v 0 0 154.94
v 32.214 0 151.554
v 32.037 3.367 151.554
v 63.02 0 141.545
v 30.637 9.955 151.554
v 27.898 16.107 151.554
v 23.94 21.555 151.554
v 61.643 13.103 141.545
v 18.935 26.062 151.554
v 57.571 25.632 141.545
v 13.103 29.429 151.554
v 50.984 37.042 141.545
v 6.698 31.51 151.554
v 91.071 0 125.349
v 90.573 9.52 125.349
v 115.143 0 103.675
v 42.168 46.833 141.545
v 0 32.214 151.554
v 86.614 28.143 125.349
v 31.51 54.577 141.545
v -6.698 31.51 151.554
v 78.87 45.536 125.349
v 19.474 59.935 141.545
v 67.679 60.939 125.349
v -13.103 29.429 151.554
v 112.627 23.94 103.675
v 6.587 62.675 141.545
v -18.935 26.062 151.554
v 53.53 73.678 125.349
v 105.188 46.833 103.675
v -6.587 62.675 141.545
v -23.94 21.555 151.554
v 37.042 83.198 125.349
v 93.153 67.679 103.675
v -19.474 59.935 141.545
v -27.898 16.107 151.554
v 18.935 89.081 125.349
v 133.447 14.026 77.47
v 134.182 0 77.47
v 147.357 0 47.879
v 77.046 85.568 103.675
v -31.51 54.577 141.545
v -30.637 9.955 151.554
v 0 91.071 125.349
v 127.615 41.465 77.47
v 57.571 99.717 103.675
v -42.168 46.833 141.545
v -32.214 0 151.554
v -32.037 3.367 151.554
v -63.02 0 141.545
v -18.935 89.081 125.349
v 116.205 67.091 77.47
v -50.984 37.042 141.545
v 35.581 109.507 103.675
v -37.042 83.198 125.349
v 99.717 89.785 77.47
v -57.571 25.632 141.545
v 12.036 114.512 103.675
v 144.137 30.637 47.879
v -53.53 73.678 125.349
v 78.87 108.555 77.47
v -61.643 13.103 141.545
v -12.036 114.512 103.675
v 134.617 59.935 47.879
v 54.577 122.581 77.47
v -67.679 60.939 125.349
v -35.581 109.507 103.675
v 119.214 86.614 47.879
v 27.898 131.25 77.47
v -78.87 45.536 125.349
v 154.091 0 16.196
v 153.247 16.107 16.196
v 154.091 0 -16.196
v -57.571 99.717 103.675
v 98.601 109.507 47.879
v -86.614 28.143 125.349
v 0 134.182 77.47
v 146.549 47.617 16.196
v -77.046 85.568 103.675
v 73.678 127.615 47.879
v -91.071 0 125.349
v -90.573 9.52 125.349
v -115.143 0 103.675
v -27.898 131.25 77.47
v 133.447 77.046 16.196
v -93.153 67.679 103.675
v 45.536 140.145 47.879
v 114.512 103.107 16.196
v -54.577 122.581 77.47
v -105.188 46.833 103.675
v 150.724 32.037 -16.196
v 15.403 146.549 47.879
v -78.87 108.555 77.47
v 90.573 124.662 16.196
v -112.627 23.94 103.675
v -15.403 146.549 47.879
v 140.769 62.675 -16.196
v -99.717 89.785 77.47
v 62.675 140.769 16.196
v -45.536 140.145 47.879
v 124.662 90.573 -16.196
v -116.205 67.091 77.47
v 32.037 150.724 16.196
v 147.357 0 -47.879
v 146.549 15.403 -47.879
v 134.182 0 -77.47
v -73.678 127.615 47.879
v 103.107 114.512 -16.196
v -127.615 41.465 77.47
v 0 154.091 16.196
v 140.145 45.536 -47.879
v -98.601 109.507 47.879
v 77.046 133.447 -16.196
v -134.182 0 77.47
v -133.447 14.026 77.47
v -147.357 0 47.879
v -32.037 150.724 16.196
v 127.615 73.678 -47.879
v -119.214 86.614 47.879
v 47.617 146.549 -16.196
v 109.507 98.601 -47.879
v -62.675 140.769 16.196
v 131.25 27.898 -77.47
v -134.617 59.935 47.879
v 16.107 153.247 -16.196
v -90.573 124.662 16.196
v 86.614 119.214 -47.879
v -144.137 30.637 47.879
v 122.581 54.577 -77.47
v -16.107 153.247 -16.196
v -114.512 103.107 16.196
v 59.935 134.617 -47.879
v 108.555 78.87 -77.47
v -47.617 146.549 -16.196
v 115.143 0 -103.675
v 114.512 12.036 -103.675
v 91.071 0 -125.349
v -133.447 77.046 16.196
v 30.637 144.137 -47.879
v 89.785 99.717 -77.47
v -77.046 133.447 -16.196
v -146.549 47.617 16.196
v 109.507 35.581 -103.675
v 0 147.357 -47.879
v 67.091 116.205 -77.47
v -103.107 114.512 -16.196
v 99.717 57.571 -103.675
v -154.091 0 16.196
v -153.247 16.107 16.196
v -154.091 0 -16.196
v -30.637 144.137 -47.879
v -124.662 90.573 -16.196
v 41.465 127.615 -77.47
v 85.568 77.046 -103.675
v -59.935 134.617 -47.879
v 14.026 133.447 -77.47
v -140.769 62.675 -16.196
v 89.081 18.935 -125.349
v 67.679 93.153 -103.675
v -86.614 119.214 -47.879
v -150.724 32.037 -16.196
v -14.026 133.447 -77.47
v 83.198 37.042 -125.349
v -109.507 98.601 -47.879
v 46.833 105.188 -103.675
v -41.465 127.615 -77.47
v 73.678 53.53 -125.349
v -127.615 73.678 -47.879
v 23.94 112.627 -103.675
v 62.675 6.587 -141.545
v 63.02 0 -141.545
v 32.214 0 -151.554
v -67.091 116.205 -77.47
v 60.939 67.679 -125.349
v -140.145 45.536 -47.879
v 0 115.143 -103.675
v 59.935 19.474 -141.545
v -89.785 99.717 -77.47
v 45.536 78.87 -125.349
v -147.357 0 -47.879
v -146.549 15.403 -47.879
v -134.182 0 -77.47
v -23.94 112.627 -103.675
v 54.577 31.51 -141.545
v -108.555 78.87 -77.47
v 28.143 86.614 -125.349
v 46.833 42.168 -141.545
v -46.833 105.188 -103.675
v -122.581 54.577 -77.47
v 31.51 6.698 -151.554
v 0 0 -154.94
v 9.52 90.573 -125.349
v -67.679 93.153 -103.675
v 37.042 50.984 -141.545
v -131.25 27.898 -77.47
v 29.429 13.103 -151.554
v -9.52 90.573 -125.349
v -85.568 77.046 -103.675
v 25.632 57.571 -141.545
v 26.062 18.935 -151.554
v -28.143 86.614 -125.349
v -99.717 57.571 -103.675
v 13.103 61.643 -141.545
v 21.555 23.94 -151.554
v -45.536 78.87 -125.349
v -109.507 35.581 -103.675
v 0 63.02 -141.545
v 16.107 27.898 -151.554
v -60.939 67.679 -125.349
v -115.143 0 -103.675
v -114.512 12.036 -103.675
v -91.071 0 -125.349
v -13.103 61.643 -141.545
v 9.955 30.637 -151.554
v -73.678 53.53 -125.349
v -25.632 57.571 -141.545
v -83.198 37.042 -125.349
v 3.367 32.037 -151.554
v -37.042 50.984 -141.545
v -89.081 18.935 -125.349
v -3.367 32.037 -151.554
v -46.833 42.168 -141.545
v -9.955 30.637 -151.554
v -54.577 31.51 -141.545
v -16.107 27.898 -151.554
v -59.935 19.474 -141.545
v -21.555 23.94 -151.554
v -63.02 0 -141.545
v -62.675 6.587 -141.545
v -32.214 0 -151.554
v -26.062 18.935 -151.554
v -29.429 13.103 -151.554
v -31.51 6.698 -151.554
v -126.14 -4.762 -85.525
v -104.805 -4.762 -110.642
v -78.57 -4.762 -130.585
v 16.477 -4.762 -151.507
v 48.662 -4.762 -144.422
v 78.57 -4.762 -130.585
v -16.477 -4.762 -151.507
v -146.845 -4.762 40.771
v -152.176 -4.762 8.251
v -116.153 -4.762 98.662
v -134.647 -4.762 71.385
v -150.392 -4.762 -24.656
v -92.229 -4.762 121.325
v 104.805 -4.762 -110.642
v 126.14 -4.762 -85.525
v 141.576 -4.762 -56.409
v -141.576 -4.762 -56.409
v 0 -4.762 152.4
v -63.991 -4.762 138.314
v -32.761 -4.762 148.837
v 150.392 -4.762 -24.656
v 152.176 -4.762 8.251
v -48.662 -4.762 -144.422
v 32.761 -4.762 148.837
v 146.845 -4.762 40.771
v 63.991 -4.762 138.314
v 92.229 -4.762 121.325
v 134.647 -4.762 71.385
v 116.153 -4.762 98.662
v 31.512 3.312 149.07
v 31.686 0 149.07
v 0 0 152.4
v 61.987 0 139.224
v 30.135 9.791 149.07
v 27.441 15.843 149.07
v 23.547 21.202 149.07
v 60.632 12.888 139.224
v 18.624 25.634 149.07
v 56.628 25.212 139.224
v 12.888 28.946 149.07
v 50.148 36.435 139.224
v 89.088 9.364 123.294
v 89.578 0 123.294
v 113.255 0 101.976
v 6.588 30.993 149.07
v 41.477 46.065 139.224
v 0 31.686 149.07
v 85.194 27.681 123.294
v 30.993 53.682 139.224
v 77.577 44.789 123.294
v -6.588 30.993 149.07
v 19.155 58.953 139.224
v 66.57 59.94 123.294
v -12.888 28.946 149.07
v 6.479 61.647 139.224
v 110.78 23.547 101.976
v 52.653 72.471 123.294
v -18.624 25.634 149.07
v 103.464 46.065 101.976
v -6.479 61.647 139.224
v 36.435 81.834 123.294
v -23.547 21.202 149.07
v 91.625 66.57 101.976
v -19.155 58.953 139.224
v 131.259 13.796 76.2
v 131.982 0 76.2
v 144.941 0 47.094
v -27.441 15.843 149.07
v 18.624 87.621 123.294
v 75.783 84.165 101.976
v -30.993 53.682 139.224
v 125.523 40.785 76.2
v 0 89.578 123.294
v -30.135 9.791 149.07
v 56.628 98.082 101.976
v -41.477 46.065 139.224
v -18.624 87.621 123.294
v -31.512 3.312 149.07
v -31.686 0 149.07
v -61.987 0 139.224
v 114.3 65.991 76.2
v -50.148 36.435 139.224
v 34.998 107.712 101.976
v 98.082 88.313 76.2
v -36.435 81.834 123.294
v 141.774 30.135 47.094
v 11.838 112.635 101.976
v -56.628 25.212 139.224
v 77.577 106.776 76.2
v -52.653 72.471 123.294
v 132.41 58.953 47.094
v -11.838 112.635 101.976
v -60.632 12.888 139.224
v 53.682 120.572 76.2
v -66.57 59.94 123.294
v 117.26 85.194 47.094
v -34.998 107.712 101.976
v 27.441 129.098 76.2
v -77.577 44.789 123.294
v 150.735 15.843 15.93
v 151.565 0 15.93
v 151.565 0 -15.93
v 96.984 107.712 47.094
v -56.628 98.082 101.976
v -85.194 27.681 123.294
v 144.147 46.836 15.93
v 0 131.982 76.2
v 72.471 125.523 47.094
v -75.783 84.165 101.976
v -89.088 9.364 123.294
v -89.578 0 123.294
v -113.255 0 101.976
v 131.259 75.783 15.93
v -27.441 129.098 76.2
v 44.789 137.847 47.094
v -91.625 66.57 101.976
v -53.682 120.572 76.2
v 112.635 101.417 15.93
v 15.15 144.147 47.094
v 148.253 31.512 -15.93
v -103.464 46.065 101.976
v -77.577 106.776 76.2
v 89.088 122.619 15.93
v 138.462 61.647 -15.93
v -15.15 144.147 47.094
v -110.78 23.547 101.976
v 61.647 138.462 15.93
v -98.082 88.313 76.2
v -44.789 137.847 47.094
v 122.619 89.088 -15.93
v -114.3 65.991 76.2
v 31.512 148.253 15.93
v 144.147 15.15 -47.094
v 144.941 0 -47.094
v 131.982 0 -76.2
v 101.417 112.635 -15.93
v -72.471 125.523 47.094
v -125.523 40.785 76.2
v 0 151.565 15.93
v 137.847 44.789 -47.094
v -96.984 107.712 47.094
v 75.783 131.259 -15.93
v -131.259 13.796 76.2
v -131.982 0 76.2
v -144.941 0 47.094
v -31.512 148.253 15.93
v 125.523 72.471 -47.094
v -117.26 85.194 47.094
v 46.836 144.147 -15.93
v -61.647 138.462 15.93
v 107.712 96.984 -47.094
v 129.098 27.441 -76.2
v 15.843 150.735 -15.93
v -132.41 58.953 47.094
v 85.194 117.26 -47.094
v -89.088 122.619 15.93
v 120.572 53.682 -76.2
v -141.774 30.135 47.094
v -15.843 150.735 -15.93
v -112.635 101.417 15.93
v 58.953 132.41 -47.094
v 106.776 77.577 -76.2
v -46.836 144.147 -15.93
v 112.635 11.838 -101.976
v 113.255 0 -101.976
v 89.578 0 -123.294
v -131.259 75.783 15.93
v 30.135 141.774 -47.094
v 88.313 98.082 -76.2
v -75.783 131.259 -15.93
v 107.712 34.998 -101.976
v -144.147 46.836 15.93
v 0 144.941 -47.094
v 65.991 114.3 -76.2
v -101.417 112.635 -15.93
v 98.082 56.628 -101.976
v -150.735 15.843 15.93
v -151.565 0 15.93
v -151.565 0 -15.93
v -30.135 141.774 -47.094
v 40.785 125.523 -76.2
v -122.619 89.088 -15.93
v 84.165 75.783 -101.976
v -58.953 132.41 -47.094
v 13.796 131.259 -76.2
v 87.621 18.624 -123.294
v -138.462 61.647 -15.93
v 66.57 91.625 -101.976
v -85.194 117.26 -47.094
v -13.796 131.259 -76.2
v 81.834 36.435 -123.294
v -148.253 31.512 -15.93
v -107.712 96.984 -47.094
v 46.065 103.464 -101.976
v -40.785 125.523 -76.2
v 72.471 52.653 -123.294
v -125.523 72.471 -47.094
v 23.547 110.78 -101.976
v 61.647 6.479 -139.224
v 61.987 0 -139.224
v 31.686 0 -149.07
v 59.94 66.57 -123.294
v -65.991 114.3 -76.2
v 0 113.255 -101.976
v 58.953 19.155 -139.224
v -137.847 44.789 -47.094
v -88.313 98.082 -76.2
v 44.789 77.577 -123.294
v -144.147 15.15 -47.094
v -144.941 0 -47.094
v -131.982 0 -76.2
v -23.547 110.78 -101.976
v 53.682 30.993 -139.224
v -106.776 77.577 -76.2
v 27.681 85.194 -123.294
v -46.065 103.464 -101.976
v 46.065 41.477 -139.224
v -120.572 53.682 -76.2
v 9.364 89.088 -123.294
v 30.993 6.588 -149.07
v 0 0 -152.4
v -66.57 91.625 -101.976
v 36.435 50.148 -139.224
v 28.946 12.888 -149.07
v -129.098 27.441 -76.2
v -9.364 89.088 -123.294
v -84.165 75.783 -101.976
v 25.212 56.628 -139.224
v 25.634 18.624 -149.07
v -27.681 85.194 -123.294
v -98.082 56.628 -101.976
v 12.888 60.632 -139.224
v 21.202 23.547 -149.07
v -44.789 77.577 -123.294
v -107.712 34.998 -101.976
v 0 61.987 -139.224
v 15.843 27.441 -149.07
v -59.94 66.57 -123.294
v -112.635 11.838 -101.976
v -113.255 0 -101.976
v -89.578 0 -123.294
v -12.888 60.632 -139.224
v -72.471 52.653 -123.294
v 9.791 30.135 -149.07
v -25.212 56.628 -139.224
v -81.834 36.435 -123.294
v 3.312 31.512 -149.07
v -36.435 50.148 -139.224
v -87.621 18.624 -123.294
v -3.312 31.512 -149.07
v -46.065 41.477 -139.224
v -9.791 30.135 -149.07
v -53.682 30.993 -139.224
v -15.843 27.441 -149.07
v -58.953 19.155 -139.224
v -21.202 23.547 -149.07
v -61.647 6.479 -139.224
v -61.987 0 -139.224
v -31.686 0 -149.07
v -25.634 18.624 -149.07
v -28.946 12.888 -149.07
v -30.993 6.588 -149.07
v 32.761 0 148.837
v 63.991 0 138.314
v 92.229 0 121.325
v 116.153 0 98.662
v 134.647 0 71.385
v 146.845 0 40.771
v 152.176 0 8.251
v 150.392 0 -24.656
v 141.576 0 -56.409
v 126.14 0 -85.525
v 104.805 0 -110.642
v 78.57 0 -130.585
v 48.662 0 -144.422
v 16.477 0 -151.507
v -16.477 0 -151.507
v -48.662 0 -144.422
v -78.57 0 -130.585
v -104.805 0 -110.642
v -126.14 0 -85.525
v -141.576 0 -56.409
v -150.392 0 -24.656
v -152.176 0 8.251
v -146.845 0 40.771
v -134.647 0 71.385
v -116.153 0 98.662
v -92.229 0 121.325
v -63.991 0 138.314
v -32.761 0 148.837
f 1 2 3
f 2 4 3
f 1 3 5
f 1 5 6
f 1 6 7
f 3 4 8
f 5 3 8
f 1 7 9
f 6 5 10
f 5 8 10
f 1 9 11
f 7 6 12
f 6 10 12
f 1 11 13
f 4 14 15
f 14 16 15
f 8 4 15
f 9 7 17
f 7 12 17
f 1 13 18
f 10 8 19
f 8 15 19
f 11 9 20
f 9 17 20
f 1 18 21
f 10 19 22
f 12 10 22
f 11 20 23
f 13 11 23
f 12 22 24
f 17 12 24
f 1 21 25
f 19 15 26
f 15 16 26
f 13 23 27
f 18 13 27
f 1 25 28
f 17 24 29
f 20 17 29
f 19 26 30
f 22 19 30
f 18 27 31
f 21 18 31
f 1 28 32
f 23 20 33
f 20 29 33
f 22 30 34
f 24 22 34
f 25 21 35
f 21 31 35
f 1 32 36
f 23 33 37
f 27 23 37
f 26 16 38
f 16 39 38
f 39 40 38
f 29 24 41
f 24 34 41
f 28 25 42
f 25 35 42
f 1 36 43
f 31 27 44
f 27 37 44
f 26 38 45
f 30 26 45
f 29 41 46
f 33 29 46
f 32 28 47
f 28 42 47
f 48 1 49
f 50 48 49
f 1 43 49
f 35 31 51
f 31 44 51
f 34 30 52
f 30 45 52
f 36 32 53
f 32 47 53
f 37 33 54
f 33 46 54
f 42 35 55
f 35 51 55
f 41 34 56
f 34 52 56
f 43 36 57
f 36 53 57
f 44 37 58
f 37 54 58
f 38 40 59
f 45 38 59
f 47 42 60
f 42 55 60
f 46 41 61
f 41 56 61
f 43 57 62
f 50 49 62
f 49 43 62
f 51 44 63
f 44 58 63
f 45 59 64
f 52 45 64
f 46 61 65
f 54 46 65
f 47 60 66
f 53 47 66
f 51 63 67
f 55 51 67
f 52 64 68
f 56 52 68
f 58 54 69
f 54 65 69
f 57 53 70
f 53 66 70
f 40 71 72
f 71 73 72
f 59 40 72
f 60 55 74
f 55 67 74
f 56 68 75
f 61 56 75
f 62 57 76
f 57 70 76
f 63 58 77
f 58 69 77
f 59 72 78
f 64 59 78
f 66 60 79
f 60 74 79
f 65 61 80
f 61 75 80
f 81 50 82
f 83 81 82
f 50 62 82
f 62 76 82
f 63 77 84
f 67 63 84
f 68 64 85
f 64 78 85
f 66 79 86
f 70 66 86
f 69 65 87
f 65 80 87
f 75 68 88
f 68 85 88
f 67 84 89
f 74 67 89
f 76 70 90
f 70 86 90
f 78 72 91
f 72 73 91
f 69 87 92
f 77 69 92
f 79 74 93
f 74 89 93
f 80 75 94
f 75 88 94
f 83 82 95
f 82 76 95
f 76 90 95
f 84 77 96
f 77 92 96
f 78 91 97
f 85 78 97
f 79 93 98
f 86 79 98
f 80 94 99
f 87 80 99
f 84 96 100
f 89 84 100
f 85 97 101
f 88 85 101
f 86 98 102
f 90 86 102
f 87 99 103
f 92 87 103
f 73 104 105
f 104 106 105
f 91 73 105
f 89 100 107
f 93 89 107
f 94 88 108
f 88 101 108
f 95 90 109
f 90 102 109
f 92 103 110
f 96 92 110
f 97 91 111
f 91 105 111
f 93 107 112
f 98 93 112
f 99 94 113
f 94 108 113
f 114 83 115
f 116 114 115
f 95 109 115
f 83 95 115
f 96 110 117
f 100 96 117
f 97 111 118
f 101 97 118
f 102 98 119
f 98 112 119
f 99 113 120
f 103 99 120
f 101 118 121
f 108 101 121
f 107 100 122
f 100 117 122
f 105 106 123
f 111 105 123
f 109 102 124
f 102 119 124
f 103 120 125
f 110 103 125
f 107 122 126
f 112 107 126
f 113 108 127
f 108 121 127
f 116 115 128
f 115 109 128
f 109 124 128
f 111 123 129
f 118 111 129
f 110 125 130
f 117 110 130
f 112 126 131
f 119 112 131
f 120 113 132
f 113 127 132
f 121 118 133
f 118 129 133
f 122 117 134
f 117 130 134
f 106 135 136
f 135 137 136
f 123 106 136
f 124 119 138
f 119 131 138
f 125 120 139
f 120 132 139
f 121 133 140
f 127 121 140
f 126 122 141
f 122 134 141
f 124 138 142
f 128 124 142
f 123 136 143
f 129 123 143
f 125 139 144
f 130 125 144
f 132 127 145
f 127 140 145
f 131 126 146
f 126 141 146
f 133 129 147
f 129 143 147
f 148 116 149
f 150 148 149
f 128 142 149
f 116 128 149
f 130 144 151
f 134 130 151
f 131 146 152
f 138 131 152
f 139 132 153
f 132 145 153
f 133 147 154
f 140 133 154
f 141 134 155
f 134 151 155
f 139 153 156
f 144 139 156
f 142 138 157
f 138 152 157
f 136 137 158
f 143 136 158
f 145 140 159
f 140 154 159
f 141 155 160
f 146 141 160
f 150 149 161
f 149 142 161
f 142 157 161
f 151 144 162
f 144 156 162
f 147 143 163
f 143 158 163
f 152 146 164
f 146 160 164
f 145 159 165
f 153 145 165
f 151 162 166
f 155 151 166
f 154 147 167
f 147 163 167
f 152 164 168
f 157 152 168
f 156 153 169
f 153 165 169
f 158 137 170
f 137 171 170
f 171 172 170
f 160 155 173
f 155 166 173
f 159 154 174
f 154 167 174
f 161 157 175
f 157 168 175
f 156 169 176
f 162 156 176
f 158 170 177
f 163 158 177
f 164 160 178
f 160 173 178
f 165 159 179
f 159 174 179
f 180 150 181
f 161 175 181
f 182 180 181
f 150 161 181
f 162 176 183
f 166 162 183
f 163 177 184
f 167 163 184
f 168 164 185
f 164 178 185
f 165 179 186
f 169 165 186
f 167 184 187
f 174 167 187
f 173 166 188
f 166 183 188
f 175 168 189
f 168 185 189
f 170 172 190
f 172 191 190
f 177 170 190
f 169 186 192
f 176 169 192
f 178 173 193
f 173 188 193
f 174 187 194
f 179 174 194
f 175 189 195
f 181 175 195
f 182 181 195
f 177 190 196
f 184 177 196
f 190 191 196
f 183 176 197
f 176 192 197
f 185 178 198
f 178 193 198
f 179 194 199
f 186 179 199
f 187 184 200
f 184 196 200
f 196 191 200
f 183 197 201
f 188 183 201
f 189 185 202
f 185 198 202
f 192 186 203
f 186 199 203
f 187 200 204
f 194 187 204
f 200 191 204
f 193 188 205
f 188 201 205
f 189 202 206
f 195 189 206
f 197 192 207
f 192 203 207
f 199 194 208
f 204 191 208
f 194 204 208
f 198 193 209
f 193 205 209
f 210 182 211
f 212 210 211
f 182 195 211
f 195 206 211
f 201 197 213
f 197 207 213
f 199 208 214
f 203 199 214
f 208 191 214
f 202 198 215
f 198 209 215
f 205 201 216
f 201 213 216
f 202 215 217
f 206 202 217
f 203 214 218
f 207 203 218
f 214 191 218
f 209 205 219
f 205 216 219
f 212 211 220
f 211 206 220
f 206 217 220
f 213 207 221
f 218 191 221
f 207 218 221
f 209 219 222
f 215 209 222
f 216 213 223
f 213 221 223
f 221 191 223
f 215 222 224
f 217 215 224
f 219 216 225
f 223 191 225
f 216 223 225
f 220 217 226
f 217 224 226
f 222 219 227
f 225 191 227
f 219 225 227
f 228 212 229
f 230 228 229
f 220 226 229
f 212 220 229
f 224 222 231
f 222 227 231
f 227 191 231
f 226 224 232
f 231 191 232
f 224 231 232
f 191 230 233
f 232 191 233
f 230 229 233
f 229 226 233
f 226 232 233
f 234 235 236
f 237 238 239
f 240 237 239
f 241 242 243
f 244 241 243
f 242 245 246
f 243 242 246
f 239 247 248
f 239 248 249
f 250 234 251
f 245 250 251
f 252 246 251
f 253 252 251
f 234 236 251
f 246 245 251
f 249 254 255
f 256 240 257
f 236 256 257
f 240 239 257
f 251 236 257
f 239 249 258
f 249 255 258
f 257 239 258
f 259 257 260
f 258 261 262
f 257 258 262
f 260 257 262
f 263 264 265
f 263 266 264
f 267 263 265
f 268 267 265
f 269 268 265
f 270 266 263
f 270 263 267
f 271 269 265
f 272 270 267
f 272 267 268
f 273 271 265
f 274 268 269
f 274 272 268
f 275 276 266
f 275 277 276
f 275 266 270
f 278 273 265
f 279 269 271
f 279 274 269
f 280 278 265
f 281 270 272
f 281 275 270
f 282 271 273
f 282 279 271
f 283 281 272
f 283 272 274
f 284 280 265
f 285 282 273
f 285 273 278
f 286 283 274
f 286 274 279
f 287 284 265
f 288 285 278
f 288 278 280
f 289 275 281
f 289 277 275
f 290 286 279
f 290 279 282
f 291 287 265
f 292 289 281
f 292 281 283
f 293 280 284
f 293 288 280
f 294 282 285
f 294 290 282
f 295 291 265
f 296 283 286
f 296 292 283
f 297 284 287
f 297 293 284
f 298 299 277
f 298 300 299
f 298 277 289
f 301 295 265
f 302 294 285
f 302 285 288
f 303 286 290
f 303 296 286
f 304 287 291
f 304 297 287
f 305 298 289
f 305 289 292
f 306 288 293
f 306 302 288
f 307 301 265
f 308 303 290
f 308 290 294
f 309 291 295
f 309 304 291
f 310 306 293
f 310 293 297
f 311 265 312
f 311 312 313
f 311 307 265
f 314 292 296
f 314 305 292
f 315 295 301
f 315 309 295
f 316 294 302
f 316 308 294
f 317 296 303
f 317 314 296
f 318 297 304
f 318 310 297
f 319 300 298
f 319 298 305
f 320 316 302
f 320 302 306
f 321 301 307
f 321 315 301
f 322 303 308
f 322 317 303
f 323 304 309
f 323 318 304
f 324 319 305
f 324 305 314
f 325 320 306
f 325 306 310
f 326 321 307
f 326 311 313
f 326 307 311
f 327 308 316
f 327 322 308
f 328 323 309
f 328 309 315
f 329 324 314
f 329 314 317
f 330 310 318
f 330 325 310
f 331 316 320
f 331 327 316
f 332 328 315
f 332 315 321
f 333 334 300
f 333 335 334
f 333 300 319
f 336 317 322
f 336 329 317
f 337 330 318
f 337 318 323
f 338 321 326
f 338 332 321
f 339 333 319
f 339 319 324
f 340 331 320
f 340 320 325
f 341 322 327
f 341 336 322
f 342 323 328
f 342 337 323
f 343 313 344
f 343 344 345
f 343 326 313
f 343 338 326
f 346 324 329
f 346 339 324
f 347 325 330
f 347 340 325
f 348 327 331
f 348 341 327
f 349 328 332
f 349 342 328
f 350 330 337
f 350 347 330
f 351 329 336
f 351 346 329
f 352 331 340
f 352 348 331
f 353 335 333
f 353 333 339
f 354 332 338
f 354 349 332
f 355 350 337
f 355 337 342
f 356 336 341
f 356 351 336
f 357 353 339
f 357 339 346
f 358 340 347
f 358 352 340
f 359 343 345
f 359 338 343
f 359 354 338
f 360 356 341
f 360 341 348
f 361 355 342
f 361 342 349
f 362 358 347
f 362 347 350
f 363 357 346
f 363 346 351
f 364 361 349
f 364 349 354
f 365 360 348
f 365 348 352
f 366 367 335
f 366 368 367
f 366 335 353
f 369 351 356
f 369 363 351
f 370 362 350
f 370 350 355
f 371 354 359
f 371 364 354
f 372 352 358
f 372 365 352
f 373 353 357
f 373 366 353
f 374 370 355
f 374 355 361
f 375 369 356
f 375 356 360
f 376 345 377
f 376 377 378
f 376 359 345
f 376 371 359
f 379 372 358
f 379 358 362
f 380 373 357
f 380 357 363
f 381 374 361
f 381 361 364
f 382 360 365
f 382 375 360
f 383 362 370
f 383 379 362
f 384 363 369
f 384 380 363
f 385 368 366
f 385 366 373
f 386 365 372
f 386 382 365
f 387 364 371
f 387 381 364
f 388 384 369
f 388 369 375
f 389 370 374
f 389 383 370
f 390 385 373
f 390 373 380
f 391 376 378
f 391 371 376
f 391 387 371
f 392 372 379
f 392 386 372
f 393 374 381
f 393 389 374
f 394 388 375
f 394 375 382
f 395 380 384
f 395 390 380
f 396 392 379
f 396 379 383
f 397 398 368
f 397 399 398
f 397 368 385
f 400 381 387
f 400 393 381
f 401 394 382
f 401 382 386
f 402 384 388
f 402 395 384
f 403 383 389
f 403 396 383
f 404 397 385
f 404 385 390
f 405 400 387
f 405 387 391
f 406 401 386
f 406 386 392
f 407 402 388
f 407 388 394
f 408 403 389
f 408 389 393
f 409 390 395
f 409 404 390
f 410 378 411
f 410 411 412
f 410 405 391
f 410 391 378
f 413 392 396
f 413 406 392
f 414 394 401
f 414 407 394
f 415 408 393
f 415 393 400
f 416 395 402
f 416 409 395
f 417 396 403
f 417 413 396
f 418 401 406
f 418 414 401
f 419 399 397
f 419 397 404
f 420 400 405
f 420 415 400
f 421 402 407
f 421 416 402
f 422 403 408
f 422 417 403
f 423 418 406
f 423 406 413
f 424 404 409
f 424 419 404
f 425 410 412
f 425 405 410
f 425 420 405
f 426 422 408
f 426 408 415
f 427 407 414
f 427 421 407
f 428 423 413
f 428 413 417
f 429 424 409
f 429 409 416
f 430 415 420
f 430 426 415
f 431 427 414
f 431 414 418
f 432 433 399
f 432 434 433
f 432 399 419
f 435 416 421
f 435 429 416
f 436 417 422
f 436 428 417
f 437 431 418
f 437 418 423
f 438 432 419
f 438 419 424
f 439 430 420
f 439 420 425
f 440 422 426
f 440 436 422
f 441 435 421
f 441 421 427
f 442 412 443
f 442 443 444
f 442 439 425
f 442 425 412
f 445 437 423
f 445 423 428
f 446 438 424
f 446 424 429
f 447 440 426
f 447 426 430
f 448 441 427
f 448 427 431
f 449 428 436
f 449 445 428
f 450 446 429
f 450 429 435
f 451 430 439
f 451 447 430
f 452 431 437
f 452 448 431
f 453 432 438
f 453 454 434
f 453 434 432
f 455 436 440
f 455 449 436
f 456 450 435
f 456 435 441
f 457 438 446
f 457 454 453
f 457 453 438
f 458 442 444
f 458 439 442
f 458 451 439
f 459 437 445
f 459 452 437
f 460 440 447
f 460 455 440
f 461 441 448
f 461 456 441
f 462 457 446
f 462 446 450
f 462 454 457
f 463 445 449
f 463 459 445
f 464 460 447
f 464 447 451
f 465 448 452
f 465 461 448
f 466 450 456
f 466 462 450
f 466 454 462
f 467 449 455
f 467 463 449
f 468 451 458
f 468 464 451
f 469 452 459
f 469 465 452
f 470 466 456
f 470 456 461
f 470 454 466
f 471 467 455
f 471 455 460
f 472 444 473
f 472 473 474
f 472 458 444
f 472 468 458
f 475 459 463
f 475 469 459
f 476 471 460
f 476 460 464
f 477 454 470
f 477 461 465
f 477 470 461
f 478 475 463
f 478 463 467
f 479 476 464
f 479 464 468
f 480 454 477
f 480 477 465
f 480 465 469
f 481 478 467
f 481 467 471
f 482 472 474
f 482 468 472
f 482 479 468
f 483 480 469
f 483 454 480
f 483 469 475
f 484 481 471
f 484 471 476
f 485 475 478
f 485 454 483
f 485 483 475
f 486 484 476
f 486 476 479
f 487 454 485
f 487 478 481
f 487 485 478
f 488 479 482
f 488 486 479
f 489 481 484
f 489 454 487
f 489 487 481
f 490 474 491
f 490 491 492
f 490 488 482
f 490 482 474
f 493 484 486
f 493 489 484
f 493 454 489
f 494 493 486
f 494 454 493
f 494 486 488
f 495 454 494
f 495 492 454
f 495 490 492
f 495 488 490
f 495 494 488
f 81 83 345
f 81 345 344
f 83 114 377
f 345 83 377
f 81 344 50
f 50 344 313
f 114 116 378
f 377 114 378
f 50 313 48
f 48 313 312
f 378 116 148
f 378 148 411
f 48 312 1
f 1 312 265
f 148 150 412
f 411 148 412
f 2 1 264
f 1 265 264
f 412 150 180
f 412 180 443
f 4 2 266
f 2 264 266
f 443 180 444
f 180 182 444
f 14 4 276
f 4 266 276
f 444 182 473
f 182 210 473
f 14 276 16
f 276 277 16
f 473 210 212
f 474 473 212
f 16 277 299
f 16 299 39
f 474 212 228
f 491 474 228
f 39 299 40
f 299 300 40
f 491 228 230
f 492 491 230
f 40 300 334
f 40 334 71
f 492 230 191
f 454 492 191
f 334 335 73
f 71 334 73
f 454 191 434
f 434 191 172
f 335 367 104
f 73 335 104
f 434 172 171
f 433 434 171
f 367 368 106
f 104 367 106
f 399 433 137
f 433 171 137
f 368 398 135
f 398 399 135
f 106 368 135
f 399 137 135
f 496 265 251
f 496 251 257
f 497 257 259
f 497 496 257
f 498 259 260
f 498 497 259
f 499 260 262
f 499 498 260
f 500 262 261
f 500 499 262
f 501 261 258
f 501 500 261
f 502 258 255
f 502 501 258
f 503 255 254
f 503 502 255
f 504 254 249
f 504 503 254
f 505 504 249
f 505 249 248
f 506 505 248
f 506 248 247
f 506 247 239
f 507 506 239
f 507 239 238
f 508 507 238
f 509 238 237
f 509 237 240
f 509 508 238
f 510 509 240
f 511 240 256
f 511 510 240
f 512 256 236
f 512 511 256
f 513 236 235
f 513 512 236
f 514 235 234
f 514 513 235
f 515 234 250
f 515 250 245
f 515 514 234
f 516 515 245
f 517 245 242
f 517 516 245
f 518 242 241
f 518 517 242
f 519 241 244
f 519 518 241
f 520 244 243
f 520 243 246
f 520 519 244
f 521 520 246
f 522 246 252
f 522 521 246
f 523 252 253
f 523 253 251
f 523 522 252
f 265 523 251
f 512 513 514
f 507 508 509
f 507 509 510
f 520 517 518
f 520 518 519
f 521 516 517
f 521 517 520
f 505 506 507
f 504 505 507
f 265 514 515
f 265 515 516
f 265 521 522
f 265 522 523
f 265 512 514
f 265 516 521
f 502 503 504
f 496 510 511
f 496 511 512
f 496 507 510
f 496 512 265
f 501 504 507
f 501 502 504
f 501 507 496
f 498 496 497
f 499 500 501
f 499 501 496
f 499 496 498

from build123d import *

# Parameters (mm, degrees)
REVOLVE1_ANGLE      = 180
SHELL1_T            = 2.54
SKETCH2_R           = 152.4
BOSS_EXTRUDE1_DEPTH = 4.7625


with BuildPart() as part:
    # Sketch1 → Revolve1 (revolve)
    with BuildSketch(Plane(origin=(0, 0, 0), x_dir=(1, 0, 0), z_dir=(0, 1, 0))):
        with BuildLine():
            Line((0, 152.4), (0, -152.4))
            ThreePointArc((0, -152.4), (152.4, 0), (0, 152.4))
        make_face()
    revolve(axis=Axis((0, 0, -152.4), (0, 0, 1)), revolution_arc=REVOLVE1_ANGLE)

    # Shell1
    shell1_openings = [part.faces().sort_by_distance(p)[0] for p in [
        (0, 0, 0),
    ]]
    offset(amount=SHELL1_T, openings=shell1_openings)


with BuildPart() as body_2:
    # Sketch2 → Boss-Extrude1 (new body)
    with BuildSketch(Plane(origin=(0, 0, 0), x_dir=(1, 0, 0), z_dir=(0, 1, 0))):
        with Locations(Location((0, 0, 0), (0, 0, 270))):
            Circle(SKETCH2_R)
    extrude(amount=-BOSS_EXTRUDE1_DEPTH)


solid = Compound([part.part, body_2.part])
